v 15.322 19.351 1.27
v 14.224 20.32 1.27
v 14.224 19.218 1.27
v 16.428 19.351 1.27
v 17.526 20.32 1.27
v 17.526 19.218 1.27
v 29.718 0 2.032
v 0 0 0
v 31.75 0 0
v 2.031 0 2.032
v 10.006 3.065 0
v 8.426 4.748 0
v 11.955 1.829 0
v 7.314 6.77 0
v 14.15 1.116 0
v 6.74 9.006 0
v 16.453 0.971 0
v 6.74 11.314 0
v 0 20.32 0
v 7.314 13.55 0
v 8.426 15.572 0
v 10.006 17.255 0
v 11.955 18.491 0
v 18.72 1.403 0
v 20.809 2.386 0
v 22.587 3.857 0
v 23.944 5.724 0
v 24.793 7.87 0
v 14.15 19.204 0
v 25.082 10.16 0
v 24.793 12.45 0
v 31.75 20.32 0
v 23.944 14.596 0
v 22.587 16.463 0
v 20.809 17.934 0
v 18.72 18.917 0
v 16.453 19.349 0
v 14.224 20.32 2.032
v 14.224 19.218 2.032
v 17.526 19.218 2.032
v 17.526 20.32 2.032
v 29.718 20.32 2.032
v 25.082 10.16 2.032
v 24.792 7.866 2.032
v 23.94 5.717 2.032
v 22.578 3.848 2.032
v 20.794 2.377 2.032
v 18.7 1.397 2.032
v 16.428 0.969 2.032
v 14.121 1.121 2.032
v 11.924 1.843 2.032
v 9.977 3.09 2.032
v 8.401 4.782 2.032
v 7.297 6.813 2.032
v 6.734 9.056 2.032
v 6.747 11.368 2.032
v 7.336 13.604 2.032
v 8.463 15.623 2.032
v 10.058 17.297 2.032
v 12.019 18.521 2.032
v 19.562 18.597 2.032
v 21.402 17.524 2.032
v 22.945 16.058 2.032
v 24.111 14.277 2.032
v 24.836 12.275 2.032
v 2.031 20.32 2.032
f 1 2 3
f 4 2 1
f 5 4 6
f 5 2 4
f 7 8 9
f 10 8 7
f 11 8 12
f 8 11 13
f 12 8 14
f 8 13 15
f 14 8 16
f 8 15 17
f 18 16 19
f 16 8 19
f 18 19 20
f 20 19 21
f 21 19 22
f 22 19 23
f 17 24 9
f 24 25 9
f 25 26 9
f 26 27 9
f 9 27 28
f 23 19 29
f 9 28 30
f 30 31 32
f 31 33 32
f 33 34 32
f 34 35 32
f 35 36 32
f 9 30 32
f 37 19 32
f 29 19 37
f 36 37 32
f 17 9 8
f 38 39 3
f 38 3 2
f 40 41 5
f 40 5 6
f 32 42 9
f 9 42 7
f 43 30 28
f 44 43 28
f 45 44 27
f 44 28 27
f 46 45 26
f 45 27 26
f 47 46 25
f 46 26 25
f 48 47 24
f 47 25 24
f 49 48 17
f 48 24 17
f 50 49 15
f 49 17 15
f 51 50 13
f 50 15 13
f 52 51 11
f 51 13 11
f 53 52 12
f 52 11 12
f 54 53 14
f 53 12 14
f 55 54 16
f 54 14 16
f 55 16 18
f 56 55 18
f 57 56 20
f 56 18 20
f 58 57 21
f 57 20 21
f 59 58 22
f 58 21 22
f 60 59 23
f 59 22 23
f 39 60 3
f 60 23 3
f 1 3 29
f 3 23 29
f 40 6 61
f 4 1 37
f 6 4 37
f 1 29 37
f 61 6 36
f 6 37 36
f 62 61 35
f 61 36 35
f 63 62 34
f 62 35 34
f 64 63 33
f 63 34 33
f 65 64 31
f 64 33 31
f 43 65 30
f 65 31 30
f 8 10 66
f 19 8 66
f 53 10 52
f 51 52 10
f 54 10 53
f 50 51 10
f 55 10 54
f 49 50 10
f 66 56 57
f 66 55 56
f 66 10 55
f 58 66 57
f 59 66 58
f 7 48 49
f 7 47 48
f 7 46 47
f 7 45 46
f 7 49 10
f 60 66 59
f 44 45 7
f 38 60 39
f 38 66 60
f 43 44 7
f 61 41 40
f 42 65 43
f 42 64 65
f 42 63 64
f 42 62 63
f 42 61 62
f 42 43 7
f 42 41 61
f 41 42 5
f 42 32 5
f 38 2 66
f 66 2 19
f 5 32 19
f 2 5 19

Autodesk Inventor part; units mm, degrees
ref_plane "YZ Plane" through (0, 0, 0) normal (1, 0, 0) x (0, 1, 0)
ref_plane "XZ Plane" through (0, 0, 0) normal (0, 1, 0) x (-1, 0, 0)
ref_plane "XY Plane" through (0, 0, 0) normal (0, 0, 1) x (1, 0, 0)
sketch "Sketch1" plane through (0, 0, 0) normal (0, 0, 1) x (1, 0, 0)
  line L0 (0, 0) -> (31.75, 0)
  line L1 (31.75, 0) -> (31.75, 20.32)
  line L2 (31.75, 20.32) -> (0, 20.32)
  line L3 (0, 20.32) -> (0, 0)
  circle A0 centre (15.875, 10.16) radius 9.2075
  dimension "d0" = 20.32
  dimension "d1" = 31.75
  dimension "d2" = 15.875
  dimension "d3" = 15.875
  dimension "d4" = 10.16
  dimension "d5" = 10.16
  dimension "d6" = 18.415
extrude "Extrusion1" add sketch "Sketch1" along normal blind 2.032
chamfer "Chamfer2" distance 2.032 angle 45 2 edges at (0, 10.16, 2.032) (31.75, 10.16, 2.032)
sketch "Sketch2" plane through (0, 0, 2.032) normal (0, 0, 1) x (1, 0, 0)
  line L0 (14.224, 21.0828) -> (17.526, 21.0828)
  line L1 (17.526, 21.0828) -> (17.526, 18.4625)
  line L2 (17.526, 18.4625) -> (14.224, 18.4625)
  line L3 (14.224, 18.4625) -> (14.224, 21.0828)
  line L4 (2.032, 0) -> (2.032, 20.32) projected
  line L5 (29.718, 20.32) -> (29.718, 0) projected
  point P0 (0, 0)
  point P1 (14.224, 19.7726)
  dimension "d15" = 12.192
  dimension "d16" = 12.192
extrude "Extrusion2" cut sketch "Sketch2" against normal blind 0.762
properties part number "org_case_psu_connector"
